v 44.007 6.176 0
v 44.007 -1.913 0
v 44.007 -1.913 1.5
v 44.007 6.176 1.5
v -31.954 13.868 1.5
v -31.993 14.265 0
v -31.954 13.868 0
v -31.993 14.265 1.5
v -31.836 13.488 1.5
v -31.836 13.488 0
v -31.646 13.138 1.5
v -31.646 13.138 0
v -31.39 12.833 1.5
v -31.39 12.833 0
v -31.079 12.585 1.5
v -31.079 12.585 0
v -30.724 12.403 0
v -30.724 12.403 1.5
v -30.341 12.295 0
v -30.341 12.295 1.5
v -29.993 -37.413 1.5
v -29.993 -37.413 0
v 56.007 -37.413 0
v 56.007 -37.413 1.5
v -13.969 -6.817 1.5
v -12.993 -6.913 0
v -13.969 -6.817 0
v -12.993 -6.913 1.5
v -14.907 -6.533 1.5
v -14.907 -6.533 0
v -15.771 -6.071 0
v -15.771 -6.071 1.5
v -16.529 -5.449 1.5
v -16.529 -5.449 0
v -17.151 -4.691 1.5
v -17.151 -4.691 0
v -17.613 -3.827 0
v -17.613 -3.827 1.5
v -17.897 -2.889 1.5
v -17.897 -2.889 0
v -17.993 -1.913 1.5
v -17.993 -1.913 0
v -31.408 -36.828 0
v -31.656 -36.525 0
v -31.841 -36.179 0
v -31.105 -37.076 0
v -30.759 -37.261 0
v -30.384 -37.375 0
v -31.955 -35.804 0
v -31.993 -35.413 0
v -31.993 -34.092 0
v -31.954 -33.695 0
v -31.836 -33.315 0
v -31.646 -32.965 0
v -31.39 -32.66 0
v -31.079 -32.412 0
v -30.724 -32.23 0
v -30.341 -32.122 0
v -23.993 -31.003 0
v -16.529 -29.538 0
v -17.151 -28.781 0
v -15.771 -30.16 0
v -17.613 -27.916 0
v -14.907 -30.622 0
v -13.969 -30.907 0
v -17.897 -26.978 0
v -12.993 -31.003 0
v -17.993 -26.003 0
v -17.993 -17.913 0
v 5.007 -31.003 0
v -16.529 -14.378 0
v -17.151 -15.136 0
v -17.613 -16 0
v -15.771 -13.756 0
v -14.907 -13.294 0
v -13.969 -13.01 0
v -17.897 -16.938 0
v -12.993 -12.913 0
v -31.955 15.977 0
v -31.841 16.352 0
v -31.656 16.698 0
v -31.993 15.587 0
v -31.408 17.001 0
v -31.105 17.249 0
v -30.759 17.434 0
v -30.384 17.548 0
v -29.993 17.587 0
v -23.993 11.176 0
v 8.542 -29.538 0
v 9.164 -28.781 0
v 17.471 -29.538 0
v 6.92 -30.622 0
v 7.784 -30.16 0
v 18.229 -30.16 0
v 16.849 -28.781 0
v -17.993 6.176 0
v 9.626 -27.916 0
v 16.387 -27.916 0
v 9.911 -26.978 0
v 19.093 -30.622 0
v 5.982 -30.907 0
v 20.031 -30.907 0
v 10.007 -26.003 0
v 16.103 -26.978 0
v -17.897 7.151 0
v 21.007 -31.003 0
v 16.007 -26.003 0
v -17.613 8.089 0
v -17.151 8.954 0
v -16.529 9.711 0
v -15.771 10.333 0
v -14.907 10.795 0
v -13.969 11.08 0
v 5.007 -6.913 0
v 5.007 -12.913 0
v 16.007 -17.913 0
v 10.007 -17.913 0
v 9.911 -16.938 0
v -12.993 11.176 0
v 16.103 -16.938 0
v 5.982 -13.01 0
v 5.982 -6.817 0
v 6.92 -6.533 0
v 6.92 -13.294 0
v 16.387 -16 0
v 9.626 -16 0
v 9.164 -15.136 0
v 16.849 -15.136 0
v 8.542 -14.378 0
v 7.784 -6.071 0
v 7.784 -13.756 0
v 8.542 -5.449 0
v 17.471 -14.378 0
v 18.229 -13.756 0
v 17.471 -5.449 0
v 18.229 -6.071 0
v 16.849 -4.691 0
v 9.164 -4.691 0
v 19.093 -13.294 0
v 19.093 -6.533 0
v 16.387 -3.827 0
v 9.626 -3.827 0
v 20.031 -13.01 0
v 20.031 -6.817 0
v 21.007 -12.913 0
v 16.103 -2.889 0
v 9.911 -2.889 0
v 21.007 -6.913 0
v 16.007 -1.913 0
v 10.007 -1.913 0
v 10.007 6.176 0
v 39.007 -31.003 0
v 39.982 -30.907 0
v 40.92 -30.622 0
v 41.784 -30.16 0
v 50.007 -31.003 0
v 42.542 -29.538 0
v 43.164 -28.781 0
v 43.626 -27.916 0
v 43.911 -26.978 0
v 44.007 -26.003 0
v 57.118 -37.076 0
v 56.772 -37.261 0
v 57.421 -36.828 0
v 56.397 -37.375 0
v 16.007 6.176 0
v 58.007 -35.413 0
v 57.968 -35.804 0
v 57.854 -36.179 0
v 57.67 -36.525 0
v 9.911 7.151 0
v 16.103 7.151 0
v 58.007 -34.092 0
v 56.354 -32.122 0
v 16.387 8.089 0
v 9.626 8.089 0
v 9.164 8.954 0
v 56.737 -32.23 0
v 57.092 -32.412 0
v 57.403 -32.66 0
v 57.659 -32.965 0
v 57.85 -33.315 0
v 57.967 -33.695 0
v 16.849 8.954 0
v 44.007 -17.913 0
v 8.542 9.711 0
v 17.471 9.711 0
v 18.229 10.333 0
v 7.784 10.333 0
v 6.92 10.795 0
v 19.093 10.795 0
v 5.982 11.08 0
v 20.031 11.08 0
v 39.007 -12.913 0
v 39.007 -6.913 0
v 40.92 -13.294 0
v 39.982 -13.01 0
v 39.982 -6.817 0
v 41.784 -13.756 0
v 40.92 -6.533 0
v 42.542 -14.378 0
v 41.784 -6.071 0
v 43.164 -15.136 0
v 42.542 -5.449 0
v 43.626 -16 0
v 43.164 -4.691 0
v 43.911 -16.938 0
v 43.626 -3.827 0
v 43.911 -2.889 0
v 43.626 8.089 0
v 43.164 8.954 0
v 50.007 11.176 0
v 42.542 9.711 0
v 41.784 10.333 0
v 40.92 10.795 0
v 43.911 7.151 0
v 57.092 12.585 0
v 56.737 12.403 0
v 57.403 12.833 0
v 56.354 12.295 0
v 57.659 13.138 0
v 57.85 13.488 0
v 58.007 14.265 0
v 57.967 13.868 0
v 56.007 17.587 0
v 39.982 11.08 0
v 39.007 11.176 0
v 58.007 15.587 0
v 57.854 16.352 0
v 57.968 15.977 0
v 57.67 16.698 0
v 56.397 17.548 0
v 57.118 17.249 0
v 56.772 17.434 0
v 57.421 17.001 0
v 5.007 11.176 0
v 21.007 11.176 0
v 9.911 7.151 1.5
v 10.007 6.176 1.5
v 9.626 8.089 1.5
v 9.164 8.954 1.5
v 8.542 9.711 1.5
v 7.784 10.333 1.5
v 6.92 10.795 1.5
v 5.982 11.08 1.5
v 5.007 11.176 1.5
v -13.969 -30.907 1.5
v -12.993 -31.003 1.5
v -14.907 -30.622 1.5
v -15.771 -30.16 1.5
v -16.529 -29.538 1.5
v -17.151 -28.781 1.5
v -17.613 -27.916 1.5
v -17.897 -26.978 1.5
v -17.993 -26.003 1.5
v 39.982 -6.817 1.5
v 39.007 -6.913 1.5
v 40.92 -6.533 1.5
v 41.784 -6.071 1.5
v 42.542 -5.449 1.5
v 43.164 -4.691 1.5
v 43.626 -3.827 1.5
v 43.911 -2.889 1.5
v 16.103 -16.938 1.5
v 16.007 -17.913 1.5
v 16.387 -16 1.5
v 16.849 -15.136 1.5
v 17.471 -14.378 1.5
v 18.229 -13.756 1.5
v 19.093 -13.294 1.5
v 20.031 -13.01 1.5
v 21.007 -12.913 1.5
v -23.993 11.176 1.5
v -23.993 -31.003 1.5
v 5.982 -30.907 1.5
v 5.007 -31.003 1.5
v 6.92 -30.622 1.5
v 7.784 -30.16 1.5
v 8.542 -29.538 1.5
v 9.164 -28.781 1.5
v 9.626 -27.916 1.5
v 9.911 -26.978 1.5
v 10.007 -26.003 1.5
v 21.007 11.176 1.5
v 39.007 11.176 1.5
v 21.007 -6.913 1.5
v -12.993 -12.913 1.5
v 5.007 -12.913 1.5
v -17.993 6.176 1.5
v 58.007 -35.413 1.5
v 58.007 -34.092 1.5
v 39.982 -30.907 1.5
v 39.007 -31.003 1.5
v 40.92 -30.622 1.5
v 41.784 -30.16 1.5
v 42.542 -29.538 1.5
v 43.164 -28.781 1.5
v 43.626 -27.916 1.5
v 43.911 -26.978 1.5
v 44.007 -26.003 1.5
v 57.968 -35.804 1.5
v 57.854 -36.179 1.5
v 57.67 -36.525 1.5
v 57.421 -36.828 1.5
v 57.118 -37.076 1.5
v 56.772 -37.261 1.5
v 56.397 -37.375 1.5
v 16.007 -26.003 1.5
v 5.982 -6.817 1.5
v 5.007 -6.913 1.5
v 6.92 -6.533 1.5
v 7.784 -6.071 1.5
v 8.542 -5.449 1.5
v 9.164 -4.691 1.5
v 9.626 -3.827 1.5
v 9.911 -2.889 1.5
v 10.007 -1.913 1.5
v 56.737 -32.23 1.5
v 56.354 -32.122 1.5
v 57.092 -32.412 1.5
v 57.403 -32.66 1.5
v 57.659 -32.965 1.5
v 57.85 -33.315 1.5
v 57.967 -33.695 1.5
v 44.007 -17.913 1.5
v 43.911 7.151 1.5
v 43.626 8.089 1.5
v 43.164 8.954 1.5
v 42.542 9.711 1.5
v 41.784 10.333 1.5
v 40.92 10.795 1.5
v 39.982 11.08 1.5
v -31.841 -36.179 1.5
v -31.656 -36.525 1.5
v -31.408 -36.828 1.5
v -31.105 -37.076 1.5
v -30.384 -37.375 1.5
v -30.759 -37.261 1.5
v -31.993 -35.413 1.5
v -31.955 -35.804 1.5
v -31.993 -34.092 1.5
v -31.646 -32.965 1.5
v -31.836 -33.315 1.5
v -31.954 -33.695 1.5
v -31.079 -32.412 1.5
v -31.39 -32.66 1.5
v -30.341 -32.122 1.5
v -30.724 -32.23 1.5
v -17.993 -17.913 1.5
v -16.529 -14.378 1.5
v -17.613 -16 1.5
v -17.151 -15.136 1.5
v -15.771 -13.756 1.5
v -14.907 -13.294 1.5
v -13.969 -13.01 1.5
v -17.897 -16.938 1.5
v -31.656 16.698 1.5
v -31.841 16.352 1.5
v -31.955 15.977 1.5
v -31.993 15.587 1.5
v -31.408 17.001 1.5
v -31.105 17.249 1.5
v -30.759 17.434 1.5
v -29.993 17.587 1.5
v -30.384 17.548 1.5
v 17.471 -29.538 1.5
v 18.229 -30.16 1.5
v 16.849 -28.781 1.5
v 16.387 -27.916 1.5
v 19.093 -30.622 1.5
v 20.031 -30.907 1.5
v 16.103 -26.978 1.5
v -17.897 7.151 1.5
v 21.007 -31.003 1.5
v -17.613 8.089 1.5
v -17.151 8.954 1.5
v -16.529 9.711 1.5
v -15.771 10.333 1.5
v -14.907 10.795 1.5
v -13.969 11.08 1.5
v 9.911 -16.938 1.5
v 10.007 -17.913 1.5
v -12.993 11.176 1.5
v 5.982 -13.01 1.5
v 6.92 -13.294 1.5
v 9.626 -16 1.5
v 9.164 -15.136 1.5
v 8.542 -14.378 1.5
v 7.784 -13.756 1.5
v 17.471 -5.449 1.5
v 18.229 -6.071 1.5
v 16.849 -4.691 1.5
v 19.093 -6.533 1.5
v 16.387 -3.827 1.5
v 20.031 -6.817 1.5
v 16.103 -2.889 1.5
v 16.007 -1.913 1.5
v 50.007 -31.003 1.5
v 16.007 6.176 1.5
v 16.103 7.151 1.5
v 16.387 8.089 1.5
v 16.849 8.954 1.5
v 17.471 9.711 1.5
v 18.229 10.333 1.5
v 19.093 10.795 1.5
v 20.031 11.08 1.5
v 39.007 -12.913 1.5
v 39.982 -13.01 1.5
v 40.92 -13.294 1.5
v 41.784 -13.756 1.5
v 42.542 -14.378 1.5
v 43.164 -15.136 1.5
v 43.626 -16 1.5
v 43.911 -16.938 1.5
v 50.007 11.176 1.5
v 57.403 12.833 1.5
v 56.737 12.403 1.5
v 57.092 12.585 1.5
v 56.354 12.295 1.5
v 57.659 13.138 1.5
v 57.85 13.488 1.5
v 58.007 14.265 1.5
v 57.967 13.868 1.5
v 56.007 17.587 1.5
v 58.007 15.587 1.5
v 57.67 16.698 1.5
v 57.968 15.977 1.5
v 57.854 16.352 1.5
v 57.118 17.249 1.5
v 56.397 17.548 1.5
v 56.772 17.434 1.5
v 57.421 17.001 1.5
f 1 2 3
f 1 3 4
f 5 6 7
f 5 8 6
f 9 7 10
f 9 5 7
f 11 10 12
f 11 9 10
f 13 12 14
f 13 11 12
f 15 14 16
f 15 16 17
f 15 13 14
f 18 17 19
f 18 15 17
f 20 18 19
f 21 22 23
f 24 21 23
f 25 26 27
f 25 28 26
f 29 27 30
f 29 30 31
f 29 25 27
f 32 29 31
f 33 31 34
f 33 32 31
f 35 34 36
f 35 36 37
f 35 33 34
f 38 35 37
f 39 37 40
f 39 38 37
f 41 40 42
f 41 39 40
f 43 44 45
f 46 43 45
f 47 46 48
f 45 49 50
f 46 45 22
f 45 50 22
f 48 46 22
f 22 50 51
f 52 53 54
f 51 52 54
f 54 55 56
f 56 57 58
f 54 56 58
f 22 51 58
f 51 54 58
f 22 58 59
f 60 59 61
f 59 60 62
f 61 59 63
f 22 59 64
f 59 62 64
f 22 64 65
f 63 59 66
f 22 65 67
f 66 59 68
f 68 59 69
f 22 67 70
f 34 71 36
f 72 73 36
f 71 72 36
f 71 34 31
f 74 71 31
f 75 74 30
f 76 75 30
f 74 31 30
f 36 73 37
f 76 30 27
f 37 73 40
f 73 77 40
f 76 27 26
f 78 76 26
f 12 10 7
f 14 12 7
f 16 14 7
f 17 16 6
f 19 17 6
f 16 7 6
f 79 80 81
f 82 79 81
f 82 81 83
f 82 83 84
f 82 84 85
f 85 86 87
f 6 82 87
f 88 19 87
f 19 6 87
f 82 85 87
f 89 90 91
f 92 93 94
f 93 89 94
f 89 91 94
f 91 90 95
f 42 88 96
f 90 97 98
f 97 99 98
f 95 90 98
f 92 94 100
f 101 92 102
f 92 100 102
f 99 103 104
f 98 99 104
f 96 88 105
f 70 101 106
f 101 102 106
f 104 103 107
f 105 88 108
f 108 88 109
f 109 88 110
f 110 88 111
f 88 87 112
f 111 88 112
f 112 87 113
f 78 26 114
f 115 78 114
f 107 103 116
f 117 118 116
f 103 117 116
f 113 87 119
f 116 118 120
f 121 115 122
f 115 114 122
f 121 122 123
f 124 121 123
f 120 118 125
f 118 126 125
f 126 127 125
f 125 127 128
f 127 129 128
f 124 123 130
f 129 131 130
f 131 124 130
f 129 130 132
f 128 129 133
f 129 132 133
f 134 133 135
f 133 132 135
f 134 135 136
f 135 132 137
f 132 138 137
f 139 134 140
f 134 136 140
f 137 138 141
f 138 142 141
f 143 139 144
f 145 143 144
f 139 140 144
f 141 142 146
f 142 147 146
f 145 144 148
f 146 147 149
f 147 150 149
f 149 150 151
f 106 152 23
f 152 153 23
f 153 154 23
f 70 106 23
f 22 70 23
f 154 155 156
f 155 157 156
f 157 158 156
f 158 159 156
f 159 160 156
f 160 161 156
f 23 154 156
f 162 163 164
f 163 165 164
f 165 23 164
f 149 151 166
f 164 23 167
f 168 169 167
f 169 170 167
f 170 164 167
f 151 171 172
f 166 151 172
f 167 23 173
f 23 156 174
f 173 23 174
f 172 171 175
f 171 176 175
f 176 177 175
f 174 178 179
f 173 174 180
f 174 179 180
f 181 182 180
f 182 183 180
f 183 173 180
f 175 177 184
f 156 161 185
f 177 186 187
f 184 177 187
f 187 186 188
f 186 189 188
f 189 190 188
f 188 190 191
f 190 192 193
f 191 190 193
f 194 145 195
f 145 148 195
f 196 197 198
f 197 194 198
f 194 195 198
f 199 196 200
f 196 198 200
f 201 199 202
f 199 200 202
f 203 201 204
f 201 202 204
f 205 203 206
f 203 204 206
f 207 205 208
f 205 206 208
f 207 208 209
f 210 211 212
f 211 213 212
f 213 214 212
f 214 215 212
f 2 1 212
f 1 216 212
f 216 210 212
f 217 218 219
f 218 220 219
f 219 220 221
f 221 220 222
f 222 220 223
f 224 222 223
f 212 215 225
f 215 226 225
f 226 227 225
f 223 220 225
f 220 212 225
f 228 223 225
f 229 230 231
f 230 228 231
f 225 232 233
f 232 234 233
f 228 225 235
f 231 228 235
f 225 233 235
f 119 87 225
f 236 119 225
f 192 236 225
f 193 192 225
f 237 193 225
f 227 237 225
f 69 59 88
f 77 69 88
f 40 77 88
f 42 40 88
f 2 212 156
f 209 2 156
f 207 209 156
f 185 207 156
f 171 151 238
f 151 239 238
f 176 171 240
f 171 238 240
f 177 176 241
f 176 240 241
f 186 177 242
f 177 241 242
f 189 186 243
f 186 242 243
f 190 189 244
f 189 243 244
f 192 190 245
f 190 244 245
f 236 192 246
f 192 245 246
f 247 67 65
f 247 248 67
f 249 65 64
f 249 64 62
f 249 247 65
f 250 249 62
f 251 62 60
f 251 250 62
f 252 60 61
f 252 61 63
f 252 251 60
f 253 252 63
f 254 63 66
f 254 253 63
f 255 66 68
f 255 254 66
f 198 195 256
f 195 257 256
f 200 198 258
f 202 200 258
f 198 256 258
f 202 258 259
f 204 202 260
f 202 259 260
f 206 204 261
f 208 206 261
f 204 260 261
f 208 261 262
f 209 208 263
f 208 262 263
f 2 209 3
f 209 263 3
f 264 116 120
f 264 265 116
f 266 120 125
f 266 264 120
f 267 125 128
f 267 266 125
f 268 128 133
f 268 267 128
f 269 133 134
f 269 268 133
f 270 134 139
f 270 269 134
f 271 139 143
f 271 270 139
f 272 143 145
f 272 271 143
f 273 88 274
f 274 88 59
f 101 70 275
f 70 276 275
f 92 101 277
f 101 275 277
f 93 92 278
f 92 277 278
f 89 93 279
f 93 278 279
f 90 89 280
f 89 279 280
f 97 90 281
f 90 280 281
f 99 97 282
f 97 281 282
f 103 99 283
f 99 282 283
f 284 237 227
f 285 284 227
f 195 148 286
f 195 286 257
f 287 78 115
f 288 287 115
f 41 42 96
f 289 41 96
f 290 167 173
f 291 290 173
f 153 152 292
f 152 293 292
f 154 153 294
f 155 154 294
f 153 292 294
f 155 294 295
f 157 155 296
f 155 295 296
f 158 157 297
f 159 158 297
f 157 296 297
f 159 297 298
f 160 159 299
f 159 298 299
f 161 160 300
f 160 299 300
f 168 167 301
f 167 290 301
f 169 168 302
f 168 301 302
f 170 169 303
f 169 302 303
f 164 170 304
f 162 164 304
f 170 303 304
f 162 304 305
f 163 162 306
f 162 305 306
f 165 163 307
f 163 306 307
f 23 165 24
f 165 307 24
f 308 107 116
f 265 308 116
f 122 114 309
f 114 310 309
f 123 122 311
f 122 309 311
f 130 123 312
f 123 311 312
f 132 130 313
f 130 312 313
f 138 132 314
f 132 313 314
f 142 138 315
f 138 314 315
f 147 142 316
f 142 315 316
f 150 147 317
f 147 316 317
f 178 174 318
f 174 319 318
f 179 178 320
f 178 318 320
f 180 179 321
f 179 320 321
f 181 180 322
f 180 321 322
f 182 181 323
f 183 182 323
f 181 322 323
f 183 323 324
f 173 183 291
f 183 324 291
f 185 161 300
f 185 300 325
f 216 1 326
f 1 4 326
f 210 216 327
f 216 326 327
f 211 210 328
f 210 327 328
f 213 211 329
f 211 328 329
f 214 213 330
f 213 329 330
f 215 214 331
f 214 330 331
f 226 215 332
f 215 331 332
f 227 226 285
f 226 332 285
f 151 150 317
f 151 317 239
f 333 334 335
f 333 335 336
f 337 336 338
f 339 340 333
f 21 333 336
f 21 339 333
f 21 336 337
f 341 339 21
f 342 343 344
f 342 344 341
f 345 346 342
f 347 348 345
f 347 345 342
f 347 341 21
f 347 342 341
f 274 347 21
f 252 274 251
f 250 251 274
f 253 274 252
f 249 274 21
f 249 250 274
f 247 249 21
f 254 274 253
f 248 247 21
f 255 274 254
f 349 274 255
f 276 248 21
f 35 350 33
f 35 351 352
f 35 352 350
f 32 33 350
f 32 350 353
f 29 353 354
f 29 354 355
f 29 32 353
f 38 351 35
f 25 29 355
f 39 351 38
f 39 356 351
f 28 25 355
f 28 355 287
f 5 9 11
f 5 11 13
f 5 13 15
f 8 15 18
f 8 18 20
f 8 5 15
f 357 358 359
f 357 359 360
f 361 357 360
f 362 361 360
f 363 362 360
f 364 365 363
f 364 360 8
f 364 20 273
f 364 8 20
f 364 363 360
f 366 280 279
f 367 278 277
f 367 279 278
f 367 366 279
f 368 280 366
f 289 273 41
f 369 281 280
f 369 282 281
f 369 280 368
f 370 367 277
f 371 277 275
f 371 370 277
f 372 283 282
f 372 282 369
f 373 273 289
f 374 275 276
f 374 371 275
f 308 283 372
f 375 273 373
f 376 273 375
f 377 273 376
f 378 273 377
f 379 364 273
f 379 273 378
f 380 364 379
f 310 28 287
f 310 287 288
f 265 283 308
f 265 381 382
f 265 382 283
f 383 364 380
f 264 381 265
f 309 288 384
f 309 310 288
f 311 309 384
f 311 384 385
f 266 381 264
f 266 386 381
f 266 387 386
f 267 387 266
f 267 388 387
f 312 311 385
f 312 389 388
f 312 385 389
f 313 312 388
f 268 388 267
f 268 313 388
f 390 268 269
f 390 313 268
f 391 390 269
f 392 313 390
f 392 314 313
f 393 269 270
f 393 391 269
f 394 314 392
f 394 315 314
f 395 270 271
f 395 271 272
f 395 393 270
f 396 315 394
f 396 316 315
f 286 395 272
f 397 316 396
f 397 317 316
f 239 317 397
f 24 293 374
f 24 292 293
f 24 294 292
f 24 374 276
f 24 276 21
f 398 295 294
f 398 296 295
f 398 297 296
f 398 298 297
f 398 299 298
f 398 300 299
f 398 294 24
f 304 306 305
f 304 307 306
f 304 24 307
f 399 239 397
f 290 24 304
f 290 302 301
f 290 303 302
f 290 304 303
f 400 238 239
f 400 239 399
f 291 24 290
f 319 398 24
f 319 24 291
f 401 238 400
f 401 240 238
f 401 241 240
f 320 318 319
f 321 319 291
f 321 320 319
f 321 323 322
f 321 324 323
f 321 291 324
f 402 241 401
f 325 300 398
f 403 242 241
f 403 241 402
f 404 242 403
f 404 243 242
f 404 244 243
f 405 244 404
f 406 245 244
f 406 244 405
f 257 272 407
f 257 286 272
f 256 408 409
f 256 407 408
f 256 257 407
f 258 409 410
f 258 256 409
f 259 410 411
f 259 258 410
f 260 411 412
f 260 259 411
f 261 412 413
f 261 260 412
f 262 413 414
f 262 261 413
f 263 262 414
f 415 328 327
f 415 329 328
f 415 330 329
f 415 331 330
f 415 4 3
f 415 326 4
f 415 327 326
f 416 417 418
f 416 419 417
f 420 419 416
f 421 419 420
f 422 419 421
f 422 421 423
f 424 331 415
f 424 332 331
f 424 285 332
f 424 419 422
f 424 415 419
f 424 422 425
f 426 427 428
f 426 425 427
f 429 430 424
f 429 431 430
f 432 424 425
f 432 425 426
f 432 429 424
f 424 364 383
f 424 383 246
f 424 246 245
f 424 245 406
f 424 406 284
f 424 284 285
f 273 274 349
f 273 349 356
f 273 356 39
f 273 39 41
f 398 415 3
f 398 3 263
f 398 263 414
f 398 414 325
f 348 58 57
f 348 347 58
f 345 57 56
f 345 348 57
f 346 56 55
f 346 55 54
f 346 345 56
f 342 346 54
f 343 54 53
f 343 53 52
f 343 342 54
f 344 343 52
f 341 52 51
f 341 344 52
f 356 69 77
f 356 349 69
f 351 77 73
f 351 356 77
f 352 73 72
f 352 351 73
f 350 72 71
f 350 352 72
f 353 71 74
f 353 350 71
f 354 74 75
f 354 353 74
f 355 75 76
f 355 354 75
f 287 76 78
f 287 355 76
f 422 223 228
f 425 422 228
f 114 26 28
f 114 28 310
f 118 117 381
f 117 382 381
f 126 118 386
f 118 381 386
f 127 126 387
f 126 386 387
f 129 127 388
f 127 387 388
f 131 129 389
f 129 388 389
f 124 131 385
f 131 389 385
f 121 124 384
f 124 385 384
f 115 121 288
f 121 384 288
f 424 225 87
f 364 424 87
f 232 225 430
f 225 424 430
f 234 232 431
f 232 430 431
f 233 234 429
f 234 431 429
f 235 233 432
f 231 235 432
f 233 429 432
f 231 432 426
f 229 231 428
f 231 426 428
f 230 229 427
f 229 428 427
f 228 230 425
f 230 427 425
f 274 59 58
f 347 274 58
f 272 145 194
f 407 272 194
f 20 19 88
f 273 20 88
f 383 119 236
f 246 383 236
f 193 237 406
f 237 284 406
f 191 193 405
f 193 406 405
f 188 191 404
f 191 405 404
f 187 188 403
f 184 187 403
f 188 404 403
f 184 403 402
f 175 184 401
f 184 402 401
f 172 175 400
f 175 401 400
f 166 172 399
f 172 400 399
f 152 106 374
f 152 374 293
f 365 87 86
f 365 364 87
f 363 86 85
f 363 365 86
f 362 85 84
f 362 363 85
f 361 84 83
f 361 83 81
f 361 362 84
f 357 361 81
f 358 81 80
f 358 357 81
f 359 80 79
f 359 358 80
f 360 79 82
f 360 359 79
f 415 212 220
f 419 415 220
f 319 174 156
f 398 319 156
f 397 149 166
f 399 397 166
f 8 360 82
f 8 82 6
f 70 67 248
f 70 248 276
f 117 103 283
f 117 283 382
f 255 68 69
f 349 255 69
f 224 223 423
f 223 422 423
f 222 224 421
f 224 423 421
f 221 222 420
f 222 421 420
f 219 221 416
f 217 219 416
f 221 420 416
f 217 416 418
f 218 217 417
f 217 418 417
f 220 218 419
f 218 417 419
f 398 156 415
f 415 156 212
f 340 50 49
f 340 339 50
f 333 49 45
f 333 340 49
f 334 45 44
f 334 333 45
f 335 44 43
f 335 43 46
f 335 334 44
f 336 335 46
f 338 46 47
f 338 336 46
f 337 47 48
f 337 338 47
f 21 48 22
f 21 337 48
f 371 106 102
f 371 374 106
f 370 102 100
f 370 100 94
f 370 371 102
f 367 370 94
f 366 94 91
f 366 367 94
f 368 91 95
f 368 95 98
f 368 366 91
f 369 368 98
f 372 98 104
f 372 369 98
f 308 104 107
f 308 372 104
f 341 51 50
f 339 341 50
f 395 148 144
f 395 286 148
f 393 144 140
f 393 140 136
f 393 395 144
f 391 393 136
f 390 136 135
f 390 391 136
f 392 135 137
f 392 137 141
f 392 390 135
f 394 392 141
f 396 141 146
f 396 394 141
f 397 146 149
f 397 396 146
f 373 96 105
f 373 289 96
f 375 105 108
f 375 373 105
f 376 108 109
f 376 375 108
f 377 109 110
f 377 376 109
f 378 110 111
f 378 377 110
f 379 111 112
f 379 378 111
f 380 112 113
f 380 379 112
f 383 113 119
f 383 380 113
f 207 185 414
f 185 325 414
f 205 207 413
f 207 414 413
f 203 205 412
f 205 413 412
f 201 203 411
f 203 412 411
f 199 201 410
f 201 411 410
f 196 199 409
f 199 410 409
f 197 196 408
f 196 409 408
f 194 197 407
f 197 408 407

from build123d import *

# Parameters (mm, degrees)
F0_W     = 28
F0_H     = 18.089384
F1_DEPTH = 1.5
F2_R     = 5
F3_R     = 2


with BuildPart() as f1:
    # F0 (on Top) → F1 (new body)
    with BuildSketch(Plane.XY):
        Polygon((58.006592, 17.586541), (-31.993408, 17.586541), (-31.993408, 12.586541), (-23.993408, 11.175925), (-23.993408, -9.913459), (-23.993408, -31.002843), (-31.993408, -32.413459), (-31.993408, -37.413459), (58.006592, -37.413459), (58.006592, -32.413459), (50.006592, -31.002843), (50.006592, -9.913459), (50.006592, 11.175925), (58.006592, 12.586541), align=None)
        with Locations((-3.993408, -21.958151)):
            Rectangle(F0_W, F0_H, mode=Mode.SUBTRACT)
        with Locations((30.006592, -21.958151)):
            Rectangle(F0_W, F0_H, mode=Mode.SUBTRACT)
        with Locations((-3.993408, 2.131233)):
            Rectangle(F0_W, F0_H, mode=Mode.SUBTRACT)
        with Locations((30.006592, 2.131233)):
            Rectangle(F0_W, F0_H, mode=Mode.SUBTRACT)
    extrude(amount=F1_DEPTH)

    # F2
    f2_edges = [f1.edges().sort_by_distance(p)[0] for p in [
        (44.006592, 11.175925, 0.75),
        (10.006592, 11.175925, 0.75),
        (44.006592, -12.913459, 0.75),
        (10.006592, -12.913459, 0.75),
        (16.006592, 11.175925, 0.75),
        (-17.993408, 11.175925, 0.75),
        (-17.993408, -12.913459, 0.75),
        (16.006592, -12.913459, 0.75),
        (16.006592, -6.913459, 0.75),
        (-17.993408, -6.913459, 0.75),
        (-17.993408, -31.002843, 0.75),
        (16.006592, -31.002843, 0.75),
        (44.006592, -6.913459, 0.75),
        (10.006592, -6.913459, 0.75),
        (44.006592, -31.002843, 0.75),
        (10.006592, -31.002843, 0.75),
    ]]
    fillet(f2_edges, radius=F2_R)

    # F3
    f3_edges = [f1.edges().sort_by_distance(p)[0] for p in [
        (-31.993408, 12.586541, 0.75),
        (-31.993408, -32.413459, 0.75),
        (58.006592, 12.586541, 0.75),
        (58.006592, -32.413459, 0.75),
        (58.006592, 17.586541, 0.75),
        (58.006592, -37.413459, 0.75),
        (-31.993408, -37.413459, 0.75),
        (-31.993408, 17.586541, 0.75),
    ]]
    fillet(f3_edges, radius=F3_R)


solid = f1.part
